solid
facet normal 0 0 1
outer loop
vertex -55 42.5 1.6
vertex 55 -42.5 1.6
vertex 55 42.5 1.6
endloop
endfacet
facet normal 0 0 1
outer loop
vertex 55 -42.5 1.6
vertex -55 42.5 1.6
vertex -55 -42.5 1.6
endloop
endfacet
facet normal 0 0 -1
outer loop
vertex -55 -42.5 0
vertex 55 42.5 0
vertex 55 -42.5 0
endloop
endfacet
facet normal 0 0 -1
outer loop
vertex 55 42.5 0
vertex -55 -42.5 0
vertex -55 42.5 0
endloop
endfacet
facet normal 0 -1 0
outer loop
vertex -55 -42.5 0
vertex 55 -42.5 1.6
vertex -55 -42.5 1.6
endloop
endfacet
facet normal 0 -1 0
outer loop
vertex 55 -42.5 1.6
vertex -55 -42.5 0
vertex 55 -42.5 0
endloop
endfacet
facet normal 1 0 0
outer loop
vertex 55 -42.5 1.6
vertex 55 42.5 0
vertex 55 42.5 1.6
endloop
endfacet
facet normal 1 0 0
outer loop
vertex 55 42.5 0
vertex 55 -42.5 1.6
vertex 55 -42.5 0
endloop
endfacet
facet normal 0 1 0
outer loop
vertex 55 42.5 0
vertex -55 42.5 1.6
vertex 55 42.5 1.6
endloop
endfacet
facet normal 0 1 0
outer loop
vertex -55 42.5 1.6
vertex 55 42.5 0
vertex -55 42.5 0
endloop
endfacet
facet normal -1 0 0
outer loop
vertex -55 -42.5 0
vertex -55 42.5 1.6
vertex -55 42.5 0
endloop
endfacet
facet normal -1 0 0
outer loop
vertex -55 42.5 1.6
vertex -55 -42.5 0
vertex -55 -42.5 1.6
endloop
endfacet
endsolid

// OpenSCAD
$fn = 64;

board_x = 110.0;
board_y = 85.0;
board_th = 1.6;

color([0.05, 0.45, 0.12])
translate([-board_x/2, -board_y/2, 0])
cube([board_x, board_y, board_th], center=false);
